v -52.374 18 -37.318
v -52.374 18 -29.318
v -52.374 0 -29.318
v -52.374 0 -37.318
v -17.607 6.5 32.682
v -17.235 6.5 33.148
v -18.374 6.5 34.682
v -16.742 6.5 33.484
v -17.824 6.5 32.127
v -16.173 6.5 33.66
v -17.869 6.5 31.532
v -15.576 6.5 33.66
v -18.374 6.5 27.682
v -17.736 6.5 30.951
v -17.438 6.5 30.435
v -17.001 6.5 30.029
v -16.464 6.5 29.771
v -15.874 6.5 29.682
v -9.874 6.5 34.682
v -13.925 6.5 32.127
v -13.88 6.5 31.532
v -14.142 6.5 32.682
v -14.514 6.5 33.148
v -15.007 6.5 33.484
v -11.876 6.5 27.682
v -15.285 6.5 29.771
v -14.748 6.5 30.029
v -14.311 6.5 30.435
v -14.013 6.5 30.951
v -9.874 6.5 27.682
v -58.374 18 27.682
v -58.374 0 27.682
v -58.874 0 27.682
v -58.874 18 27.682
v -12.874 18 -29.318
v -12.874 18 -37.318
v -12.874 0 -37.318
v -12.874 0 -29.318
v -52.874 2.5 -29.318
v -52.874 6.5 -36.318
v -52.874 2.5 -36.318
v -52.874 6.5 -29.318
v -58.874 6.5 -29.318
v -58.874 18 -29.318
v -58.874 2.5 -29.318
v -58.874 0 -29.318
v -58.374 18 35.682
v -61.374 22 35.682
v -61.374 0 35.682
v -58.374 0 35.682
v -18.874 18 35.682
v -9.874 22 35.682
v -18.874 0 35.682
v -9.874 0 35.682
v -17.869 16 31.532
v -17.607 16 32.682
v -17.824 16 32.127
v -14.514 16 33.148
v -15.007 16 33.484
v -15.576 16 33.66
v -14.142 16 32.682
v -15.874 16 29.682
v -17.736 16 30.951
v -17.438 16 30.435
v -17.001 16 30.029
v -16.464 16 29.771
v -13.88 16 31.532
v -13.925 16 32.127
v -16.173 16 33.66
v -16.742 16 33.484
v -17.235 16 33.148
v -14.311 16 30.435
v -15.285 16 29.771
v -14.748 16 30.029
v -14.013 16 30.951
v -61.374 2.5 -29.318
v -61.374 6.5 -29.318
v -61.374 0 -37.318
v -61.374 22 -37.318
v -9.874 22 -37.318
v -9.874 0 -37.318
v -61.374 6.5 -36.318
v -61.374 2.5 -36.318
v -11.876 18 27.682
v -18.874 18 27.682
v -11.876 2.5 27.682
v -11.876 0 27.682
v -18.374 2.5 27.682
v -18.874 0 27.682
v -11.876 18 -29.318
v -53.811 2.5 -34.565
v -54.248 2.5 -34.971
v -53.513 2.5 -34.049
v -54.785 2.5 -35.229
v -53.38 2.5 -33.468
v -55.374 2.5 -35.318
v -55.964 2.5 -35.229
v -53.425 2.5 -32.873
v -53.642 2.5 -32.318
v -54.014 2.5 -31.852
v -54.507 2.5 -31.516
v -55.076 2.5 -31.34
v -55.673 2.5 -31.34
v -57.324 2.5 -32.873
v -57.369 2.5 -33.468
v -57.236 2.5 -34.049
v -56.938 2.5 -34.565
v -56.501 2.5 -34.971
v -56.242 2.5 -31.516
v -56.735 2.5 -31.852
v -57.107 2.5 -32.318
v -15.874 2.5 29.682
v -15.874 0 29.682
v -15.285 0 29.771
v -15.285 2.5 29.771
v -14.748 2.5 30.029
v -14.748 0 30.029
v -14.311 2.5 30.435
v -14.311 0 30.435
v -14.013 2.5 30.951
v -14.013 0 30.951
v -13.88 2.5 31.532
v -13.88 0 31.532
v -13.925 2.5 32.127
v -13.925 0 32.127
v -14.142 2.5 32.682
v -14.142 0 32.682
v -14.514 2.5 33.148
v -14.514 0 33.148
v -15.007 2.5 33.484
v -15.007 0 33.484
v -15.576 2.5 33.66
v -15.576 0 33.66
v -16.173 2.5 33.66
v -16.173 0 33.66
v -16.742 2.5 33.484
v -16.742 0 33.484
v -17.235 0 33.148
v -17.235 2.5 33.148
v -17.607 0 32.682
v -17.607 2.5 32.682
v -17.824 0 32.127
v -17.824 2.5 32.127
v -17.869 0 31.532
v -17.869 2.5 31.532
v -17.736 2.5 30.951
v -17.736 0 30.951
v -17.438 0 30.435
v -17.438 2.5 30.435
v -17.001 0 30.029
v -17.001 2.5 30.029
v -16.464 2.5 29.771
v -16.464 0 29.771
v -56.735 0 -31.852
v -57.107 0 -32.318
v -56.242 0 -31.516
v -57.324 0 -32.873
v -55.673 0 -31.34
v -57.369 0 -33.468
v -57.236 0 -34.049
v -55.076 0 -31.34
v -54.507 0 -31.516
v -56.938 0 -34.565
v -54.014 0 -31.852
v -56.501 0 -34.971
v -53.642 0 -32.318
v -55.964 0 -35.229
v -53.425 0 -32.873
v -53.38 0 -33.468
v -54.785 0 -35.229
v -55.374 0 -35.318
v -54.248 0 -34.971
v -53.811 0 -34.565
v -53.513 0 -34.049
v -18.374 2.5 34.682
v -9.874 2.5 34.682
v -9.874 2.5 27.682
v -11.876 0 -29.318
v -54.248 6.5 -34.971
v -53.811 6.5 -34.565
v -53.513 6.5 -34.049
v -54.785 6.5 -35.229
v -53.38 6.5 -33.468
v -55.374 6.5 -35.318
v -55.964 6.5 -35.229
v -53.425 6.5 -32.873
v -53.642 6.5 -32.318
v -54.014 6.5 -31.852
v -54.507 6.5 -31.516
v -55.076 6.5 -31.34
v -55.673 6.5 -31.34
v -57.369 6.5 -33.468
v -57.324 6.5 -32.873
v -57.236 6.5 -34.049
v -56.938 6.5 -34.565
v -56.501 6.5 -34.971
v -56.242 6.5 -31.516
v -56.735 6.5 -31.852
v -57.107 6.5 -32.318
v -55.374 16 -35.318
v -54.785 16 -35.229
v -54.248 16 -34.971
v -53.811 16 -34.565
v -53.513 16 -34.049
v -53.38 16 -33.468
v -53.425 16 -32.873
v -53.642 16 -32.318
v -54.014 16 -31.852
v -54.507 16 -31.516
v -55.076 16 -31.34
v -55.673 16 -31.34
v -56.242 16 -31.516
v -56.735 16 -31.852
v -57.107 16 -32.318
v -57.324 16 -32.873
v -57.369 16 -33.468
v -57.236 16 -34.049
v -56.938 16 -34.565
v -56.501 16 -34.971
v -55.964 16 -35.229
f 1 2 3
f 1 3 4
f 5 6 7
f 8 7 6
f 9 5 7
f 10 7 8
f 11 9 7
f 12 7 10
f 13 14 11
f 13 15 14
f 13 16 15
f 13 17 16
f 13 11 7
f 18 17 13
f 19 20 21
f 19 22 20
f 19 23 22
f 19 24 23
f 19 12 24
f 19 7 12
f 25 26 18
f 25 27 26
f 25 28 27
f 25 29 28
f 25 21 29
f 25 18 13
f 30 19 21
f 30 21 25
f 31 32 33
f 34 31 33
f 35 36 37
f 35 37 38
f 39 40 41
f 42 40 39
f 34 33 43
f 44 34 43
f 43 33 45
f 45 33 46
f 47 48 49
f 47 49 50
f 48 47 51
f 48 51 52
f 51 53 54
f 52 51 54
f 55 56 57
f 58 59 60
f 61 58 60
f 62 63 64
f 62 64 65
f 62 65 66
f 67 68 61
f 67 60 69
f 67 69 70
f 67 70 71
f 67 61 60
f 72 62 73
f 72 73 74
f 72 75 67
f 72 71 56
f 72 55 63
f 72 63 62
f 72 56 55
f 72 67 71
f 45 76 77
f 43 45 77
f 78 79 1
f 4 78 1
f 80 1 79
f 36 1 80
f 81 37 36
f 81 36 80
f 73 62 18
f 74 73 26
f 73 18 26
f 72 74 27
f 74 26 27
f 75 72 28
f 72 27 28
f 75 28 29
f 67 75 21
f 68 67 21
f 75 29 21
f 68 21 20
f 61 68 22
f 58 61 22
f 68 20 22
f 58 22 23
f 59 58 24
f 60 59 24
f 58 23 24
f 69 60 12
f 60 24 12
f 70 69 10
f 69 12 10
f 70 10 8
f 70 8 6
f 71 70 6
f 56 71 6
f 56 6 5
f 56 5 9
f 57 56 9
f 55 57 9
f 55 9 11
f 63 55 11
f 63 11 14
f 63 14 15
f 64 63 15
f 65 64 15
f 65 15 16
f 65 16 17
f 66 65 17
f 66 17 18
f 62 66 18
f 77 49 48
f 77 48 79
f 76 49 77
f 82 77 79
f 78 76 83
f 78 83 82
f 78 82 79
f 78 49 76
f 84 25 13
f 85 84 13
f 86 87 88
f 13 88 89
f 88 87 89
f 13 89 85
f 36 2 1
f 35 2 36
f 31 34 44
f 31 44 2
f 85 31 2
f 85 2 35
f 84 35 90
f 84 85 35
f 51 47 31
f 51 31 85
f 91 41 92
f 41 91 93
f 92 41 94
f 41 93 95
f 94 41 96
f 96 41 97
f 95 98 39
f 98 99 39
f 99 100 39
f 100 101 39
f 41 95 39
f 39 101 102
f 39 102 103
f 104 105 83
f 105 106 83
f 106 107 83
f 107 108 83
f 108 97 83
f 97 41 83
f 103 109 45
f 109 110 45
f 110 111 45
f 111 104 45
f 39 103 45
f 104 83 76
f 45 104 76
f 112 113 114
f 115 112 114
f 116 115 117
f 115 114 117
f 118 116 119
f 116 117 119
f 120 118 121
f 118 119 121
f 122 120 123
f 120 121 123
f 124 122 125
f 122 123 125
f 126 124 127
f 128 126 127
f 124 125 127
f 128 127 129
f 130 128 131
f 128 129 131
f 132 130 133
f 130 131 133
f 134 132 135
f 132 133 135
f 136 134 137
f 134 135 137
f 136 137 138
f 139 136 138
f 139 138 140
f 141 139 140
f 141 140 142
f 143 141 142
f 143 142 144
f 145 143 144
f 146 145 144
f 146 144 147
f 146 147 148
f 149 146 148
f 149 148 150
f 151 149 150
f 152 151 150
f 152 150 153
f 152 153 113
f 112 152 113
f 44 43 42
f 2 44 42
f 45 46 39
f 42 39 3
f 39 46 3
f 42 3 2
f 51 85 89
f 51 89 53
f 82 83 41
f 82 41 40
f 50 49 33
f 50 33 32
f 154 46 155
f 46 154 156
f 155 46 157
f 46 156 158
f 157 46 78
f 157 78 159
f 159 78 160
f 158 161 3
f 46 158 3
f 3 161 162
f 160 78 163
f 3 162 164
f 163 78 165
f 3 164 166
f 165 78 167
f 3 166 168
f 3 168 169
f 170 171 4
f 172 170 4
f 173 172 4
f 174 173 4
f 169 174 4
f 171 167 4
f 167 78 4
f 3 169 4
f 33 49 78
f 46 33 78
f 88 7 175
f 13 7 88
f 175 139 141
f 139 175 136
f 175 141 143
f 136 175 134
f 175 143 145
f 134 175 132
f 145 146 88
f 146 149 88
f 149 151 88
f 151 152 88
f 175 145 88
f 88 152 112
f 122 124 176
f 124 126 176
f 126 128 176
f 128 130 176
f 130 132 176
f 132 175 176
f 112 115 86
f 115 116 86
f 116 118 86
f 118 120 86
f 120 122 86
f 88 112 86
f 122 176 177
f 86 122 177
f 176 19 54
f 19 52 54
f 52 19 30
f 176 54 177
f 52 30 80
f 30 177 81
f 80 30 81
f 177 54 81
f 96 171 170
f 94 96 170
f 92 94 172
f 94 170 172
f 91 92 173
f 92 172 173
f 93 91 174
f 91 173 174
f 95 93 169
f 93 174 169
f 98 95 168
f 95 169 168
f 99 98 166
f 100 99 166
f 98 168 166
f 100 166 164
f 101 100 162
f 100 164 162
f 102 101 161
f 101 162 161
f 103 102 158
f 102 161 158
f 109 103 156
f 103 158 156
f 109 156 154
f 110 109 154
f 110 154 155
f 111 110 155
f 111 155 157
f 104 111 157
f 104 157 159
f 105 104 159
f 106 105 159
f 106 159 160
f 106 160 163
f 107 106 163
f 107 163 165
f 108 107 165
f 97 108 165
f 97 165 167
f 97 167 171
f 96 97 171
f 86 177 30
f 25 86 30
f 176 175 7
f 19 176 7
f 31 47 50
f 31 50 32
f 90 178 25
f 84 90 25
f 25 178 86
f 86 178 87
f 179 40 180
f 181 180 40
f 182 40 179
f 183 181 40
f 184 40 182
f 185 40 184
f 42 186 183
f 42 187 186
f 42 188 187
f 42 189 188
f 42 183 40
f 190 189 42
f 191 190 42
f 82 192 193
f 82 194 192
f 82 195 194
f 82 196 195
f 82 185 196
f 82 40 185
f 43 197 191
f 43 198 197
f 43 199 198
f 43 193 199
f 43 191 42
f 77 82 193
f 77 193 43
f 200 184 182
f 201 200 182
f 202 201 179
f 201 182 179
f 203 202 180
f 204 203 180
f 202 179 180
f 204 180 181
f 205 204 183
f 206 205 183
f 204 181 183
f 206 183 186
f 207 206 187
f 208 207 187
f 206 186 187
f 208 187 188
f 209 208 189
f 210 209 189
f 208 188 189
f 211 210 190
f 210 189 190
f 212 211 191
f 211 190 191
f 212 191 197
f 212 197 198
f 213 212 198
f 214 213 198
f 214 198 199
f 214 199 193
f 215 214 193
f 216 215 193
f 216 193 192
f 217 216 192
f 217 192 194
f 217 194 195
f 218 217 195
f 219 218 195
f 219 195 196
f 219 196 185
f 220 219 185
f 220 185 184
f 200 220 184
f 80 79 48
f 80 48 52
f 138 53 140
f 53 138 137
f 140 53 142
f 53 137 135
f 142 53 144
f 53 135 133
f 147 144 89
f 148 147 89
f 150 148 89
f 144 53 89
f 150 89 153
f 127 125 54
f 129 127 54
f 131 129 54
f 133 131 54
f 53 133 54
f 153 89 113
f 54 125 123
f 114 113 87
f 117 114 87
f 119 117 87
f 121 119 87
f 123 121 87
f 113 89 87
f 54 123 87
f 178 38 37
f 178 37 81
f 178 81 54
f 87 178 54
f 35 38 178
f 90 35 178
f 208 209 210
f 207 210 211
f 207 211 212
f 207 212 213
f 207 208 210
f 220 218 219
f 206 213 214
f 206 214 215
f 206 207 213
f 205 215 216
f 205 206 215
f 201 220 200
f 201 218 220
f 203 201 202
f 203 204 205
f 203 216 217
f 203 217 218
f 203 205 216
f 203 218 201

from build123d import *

# Parameters (mm, degrees)
SKETCH1_W           = 51.5
SKETCH1_H           = 73
BOSS_EXTRUDE1_DEPTH = 22
CUT_EXTRUDE1_DEPTH  = 18
SKETCH4_R           = 2
CUT_EXTRUDE2_DEPTH  = 16
SKETCH7_W           = 7
SKETCH7_H           = 4
CUT_EXTRUDE3_DEPTH  = 8.5
SKETCH9_W           = 7
SKETCH9_H           = 4
CUT_EXTRUDE4_DEPTH  = 8.5


with BuildPart() as part:
    # Sketch1 → Boss-Extrude1 (new body)
    with BuildSketch(Plane(origin=(0, 0, 0), x_dir=(1, 0, 0), z_dir=(0, 1, 0))):
        with Locations((-35.624481527, 0.818123821)):
            Rectangle(SKETCH1_W, SKETCH1_H)
    extrude(amount=BOSS_EXTRUDE1_DEPTH)

    # Sketch2 → Cut-Extrude1 (cut)
    with BuildSketch(Plane.XZ):
        Polygon((-58.374481527, 27.681876179), (-58.874481527, 27.681876179), (-58.874481527, -29.318123821), (-52.374481527, -29.318123821), (-52.374481527, -37.318123821), (-12.874481527, -37.318123821), (-12.874481527, -29.318123821), (-11.875874941, -29.318123821), (-11.875874941, 27.681876179), (-18.874481527, 27.681876179), (-18.874481527, 35.681876179), (-54.374481527, 35.681876179), (-58.374481527, 35.681876179), align=None)
    extrude(amount=-CUT_EXTRUDE1_DEPTH, mode=Mode.SUBTRACT)

    # Sketch4 → Cut-Extrude2 (cut)
    with BuildSketch(Plane.XZ):
        with Locations(Location((-15.874481527, 31.681876179, 0), (0, 0, 270))):
            Circle(SKETCH4_R)
        with Locations(Location((-55.374481527, -33.318123821, 0), (0, 0, 270))):
            Circle(SKETCH4_R)
    extrude(amount=-CUT_EXTRUDE2_DEPTH, mode=Mode.SUBTRACT)

    # Sketch7 → Cut-Extrude3 (cut)
    with BuildSketch(Plane.ZY.offset(61.374481527)):
        with Locations((-32.818123821, 4.5)):
            Rectangle(SKETCH7_W, SKETCH7_H)
    extrude(amount=-CUT_EXTRUDE3_DEPTH, mode=Mode.SUBTRACT)

    # Sketch9 → Cut-Extrude4 (cut)
    with BuildSketch(Plane(origin=(-9.874481527, 0, 0), x_dir=(0, 0, -1), z_dir=(1, 0, 0))):
        with Locations((-31.181876179, 4.5)):
            Rectangle(SKETCH9_W, SKETCH9_H)
    extrude(amount=-CUT_EXTRUDE4_DEPTH, mode=Mode.SUBTRACT)


solid = part.part
